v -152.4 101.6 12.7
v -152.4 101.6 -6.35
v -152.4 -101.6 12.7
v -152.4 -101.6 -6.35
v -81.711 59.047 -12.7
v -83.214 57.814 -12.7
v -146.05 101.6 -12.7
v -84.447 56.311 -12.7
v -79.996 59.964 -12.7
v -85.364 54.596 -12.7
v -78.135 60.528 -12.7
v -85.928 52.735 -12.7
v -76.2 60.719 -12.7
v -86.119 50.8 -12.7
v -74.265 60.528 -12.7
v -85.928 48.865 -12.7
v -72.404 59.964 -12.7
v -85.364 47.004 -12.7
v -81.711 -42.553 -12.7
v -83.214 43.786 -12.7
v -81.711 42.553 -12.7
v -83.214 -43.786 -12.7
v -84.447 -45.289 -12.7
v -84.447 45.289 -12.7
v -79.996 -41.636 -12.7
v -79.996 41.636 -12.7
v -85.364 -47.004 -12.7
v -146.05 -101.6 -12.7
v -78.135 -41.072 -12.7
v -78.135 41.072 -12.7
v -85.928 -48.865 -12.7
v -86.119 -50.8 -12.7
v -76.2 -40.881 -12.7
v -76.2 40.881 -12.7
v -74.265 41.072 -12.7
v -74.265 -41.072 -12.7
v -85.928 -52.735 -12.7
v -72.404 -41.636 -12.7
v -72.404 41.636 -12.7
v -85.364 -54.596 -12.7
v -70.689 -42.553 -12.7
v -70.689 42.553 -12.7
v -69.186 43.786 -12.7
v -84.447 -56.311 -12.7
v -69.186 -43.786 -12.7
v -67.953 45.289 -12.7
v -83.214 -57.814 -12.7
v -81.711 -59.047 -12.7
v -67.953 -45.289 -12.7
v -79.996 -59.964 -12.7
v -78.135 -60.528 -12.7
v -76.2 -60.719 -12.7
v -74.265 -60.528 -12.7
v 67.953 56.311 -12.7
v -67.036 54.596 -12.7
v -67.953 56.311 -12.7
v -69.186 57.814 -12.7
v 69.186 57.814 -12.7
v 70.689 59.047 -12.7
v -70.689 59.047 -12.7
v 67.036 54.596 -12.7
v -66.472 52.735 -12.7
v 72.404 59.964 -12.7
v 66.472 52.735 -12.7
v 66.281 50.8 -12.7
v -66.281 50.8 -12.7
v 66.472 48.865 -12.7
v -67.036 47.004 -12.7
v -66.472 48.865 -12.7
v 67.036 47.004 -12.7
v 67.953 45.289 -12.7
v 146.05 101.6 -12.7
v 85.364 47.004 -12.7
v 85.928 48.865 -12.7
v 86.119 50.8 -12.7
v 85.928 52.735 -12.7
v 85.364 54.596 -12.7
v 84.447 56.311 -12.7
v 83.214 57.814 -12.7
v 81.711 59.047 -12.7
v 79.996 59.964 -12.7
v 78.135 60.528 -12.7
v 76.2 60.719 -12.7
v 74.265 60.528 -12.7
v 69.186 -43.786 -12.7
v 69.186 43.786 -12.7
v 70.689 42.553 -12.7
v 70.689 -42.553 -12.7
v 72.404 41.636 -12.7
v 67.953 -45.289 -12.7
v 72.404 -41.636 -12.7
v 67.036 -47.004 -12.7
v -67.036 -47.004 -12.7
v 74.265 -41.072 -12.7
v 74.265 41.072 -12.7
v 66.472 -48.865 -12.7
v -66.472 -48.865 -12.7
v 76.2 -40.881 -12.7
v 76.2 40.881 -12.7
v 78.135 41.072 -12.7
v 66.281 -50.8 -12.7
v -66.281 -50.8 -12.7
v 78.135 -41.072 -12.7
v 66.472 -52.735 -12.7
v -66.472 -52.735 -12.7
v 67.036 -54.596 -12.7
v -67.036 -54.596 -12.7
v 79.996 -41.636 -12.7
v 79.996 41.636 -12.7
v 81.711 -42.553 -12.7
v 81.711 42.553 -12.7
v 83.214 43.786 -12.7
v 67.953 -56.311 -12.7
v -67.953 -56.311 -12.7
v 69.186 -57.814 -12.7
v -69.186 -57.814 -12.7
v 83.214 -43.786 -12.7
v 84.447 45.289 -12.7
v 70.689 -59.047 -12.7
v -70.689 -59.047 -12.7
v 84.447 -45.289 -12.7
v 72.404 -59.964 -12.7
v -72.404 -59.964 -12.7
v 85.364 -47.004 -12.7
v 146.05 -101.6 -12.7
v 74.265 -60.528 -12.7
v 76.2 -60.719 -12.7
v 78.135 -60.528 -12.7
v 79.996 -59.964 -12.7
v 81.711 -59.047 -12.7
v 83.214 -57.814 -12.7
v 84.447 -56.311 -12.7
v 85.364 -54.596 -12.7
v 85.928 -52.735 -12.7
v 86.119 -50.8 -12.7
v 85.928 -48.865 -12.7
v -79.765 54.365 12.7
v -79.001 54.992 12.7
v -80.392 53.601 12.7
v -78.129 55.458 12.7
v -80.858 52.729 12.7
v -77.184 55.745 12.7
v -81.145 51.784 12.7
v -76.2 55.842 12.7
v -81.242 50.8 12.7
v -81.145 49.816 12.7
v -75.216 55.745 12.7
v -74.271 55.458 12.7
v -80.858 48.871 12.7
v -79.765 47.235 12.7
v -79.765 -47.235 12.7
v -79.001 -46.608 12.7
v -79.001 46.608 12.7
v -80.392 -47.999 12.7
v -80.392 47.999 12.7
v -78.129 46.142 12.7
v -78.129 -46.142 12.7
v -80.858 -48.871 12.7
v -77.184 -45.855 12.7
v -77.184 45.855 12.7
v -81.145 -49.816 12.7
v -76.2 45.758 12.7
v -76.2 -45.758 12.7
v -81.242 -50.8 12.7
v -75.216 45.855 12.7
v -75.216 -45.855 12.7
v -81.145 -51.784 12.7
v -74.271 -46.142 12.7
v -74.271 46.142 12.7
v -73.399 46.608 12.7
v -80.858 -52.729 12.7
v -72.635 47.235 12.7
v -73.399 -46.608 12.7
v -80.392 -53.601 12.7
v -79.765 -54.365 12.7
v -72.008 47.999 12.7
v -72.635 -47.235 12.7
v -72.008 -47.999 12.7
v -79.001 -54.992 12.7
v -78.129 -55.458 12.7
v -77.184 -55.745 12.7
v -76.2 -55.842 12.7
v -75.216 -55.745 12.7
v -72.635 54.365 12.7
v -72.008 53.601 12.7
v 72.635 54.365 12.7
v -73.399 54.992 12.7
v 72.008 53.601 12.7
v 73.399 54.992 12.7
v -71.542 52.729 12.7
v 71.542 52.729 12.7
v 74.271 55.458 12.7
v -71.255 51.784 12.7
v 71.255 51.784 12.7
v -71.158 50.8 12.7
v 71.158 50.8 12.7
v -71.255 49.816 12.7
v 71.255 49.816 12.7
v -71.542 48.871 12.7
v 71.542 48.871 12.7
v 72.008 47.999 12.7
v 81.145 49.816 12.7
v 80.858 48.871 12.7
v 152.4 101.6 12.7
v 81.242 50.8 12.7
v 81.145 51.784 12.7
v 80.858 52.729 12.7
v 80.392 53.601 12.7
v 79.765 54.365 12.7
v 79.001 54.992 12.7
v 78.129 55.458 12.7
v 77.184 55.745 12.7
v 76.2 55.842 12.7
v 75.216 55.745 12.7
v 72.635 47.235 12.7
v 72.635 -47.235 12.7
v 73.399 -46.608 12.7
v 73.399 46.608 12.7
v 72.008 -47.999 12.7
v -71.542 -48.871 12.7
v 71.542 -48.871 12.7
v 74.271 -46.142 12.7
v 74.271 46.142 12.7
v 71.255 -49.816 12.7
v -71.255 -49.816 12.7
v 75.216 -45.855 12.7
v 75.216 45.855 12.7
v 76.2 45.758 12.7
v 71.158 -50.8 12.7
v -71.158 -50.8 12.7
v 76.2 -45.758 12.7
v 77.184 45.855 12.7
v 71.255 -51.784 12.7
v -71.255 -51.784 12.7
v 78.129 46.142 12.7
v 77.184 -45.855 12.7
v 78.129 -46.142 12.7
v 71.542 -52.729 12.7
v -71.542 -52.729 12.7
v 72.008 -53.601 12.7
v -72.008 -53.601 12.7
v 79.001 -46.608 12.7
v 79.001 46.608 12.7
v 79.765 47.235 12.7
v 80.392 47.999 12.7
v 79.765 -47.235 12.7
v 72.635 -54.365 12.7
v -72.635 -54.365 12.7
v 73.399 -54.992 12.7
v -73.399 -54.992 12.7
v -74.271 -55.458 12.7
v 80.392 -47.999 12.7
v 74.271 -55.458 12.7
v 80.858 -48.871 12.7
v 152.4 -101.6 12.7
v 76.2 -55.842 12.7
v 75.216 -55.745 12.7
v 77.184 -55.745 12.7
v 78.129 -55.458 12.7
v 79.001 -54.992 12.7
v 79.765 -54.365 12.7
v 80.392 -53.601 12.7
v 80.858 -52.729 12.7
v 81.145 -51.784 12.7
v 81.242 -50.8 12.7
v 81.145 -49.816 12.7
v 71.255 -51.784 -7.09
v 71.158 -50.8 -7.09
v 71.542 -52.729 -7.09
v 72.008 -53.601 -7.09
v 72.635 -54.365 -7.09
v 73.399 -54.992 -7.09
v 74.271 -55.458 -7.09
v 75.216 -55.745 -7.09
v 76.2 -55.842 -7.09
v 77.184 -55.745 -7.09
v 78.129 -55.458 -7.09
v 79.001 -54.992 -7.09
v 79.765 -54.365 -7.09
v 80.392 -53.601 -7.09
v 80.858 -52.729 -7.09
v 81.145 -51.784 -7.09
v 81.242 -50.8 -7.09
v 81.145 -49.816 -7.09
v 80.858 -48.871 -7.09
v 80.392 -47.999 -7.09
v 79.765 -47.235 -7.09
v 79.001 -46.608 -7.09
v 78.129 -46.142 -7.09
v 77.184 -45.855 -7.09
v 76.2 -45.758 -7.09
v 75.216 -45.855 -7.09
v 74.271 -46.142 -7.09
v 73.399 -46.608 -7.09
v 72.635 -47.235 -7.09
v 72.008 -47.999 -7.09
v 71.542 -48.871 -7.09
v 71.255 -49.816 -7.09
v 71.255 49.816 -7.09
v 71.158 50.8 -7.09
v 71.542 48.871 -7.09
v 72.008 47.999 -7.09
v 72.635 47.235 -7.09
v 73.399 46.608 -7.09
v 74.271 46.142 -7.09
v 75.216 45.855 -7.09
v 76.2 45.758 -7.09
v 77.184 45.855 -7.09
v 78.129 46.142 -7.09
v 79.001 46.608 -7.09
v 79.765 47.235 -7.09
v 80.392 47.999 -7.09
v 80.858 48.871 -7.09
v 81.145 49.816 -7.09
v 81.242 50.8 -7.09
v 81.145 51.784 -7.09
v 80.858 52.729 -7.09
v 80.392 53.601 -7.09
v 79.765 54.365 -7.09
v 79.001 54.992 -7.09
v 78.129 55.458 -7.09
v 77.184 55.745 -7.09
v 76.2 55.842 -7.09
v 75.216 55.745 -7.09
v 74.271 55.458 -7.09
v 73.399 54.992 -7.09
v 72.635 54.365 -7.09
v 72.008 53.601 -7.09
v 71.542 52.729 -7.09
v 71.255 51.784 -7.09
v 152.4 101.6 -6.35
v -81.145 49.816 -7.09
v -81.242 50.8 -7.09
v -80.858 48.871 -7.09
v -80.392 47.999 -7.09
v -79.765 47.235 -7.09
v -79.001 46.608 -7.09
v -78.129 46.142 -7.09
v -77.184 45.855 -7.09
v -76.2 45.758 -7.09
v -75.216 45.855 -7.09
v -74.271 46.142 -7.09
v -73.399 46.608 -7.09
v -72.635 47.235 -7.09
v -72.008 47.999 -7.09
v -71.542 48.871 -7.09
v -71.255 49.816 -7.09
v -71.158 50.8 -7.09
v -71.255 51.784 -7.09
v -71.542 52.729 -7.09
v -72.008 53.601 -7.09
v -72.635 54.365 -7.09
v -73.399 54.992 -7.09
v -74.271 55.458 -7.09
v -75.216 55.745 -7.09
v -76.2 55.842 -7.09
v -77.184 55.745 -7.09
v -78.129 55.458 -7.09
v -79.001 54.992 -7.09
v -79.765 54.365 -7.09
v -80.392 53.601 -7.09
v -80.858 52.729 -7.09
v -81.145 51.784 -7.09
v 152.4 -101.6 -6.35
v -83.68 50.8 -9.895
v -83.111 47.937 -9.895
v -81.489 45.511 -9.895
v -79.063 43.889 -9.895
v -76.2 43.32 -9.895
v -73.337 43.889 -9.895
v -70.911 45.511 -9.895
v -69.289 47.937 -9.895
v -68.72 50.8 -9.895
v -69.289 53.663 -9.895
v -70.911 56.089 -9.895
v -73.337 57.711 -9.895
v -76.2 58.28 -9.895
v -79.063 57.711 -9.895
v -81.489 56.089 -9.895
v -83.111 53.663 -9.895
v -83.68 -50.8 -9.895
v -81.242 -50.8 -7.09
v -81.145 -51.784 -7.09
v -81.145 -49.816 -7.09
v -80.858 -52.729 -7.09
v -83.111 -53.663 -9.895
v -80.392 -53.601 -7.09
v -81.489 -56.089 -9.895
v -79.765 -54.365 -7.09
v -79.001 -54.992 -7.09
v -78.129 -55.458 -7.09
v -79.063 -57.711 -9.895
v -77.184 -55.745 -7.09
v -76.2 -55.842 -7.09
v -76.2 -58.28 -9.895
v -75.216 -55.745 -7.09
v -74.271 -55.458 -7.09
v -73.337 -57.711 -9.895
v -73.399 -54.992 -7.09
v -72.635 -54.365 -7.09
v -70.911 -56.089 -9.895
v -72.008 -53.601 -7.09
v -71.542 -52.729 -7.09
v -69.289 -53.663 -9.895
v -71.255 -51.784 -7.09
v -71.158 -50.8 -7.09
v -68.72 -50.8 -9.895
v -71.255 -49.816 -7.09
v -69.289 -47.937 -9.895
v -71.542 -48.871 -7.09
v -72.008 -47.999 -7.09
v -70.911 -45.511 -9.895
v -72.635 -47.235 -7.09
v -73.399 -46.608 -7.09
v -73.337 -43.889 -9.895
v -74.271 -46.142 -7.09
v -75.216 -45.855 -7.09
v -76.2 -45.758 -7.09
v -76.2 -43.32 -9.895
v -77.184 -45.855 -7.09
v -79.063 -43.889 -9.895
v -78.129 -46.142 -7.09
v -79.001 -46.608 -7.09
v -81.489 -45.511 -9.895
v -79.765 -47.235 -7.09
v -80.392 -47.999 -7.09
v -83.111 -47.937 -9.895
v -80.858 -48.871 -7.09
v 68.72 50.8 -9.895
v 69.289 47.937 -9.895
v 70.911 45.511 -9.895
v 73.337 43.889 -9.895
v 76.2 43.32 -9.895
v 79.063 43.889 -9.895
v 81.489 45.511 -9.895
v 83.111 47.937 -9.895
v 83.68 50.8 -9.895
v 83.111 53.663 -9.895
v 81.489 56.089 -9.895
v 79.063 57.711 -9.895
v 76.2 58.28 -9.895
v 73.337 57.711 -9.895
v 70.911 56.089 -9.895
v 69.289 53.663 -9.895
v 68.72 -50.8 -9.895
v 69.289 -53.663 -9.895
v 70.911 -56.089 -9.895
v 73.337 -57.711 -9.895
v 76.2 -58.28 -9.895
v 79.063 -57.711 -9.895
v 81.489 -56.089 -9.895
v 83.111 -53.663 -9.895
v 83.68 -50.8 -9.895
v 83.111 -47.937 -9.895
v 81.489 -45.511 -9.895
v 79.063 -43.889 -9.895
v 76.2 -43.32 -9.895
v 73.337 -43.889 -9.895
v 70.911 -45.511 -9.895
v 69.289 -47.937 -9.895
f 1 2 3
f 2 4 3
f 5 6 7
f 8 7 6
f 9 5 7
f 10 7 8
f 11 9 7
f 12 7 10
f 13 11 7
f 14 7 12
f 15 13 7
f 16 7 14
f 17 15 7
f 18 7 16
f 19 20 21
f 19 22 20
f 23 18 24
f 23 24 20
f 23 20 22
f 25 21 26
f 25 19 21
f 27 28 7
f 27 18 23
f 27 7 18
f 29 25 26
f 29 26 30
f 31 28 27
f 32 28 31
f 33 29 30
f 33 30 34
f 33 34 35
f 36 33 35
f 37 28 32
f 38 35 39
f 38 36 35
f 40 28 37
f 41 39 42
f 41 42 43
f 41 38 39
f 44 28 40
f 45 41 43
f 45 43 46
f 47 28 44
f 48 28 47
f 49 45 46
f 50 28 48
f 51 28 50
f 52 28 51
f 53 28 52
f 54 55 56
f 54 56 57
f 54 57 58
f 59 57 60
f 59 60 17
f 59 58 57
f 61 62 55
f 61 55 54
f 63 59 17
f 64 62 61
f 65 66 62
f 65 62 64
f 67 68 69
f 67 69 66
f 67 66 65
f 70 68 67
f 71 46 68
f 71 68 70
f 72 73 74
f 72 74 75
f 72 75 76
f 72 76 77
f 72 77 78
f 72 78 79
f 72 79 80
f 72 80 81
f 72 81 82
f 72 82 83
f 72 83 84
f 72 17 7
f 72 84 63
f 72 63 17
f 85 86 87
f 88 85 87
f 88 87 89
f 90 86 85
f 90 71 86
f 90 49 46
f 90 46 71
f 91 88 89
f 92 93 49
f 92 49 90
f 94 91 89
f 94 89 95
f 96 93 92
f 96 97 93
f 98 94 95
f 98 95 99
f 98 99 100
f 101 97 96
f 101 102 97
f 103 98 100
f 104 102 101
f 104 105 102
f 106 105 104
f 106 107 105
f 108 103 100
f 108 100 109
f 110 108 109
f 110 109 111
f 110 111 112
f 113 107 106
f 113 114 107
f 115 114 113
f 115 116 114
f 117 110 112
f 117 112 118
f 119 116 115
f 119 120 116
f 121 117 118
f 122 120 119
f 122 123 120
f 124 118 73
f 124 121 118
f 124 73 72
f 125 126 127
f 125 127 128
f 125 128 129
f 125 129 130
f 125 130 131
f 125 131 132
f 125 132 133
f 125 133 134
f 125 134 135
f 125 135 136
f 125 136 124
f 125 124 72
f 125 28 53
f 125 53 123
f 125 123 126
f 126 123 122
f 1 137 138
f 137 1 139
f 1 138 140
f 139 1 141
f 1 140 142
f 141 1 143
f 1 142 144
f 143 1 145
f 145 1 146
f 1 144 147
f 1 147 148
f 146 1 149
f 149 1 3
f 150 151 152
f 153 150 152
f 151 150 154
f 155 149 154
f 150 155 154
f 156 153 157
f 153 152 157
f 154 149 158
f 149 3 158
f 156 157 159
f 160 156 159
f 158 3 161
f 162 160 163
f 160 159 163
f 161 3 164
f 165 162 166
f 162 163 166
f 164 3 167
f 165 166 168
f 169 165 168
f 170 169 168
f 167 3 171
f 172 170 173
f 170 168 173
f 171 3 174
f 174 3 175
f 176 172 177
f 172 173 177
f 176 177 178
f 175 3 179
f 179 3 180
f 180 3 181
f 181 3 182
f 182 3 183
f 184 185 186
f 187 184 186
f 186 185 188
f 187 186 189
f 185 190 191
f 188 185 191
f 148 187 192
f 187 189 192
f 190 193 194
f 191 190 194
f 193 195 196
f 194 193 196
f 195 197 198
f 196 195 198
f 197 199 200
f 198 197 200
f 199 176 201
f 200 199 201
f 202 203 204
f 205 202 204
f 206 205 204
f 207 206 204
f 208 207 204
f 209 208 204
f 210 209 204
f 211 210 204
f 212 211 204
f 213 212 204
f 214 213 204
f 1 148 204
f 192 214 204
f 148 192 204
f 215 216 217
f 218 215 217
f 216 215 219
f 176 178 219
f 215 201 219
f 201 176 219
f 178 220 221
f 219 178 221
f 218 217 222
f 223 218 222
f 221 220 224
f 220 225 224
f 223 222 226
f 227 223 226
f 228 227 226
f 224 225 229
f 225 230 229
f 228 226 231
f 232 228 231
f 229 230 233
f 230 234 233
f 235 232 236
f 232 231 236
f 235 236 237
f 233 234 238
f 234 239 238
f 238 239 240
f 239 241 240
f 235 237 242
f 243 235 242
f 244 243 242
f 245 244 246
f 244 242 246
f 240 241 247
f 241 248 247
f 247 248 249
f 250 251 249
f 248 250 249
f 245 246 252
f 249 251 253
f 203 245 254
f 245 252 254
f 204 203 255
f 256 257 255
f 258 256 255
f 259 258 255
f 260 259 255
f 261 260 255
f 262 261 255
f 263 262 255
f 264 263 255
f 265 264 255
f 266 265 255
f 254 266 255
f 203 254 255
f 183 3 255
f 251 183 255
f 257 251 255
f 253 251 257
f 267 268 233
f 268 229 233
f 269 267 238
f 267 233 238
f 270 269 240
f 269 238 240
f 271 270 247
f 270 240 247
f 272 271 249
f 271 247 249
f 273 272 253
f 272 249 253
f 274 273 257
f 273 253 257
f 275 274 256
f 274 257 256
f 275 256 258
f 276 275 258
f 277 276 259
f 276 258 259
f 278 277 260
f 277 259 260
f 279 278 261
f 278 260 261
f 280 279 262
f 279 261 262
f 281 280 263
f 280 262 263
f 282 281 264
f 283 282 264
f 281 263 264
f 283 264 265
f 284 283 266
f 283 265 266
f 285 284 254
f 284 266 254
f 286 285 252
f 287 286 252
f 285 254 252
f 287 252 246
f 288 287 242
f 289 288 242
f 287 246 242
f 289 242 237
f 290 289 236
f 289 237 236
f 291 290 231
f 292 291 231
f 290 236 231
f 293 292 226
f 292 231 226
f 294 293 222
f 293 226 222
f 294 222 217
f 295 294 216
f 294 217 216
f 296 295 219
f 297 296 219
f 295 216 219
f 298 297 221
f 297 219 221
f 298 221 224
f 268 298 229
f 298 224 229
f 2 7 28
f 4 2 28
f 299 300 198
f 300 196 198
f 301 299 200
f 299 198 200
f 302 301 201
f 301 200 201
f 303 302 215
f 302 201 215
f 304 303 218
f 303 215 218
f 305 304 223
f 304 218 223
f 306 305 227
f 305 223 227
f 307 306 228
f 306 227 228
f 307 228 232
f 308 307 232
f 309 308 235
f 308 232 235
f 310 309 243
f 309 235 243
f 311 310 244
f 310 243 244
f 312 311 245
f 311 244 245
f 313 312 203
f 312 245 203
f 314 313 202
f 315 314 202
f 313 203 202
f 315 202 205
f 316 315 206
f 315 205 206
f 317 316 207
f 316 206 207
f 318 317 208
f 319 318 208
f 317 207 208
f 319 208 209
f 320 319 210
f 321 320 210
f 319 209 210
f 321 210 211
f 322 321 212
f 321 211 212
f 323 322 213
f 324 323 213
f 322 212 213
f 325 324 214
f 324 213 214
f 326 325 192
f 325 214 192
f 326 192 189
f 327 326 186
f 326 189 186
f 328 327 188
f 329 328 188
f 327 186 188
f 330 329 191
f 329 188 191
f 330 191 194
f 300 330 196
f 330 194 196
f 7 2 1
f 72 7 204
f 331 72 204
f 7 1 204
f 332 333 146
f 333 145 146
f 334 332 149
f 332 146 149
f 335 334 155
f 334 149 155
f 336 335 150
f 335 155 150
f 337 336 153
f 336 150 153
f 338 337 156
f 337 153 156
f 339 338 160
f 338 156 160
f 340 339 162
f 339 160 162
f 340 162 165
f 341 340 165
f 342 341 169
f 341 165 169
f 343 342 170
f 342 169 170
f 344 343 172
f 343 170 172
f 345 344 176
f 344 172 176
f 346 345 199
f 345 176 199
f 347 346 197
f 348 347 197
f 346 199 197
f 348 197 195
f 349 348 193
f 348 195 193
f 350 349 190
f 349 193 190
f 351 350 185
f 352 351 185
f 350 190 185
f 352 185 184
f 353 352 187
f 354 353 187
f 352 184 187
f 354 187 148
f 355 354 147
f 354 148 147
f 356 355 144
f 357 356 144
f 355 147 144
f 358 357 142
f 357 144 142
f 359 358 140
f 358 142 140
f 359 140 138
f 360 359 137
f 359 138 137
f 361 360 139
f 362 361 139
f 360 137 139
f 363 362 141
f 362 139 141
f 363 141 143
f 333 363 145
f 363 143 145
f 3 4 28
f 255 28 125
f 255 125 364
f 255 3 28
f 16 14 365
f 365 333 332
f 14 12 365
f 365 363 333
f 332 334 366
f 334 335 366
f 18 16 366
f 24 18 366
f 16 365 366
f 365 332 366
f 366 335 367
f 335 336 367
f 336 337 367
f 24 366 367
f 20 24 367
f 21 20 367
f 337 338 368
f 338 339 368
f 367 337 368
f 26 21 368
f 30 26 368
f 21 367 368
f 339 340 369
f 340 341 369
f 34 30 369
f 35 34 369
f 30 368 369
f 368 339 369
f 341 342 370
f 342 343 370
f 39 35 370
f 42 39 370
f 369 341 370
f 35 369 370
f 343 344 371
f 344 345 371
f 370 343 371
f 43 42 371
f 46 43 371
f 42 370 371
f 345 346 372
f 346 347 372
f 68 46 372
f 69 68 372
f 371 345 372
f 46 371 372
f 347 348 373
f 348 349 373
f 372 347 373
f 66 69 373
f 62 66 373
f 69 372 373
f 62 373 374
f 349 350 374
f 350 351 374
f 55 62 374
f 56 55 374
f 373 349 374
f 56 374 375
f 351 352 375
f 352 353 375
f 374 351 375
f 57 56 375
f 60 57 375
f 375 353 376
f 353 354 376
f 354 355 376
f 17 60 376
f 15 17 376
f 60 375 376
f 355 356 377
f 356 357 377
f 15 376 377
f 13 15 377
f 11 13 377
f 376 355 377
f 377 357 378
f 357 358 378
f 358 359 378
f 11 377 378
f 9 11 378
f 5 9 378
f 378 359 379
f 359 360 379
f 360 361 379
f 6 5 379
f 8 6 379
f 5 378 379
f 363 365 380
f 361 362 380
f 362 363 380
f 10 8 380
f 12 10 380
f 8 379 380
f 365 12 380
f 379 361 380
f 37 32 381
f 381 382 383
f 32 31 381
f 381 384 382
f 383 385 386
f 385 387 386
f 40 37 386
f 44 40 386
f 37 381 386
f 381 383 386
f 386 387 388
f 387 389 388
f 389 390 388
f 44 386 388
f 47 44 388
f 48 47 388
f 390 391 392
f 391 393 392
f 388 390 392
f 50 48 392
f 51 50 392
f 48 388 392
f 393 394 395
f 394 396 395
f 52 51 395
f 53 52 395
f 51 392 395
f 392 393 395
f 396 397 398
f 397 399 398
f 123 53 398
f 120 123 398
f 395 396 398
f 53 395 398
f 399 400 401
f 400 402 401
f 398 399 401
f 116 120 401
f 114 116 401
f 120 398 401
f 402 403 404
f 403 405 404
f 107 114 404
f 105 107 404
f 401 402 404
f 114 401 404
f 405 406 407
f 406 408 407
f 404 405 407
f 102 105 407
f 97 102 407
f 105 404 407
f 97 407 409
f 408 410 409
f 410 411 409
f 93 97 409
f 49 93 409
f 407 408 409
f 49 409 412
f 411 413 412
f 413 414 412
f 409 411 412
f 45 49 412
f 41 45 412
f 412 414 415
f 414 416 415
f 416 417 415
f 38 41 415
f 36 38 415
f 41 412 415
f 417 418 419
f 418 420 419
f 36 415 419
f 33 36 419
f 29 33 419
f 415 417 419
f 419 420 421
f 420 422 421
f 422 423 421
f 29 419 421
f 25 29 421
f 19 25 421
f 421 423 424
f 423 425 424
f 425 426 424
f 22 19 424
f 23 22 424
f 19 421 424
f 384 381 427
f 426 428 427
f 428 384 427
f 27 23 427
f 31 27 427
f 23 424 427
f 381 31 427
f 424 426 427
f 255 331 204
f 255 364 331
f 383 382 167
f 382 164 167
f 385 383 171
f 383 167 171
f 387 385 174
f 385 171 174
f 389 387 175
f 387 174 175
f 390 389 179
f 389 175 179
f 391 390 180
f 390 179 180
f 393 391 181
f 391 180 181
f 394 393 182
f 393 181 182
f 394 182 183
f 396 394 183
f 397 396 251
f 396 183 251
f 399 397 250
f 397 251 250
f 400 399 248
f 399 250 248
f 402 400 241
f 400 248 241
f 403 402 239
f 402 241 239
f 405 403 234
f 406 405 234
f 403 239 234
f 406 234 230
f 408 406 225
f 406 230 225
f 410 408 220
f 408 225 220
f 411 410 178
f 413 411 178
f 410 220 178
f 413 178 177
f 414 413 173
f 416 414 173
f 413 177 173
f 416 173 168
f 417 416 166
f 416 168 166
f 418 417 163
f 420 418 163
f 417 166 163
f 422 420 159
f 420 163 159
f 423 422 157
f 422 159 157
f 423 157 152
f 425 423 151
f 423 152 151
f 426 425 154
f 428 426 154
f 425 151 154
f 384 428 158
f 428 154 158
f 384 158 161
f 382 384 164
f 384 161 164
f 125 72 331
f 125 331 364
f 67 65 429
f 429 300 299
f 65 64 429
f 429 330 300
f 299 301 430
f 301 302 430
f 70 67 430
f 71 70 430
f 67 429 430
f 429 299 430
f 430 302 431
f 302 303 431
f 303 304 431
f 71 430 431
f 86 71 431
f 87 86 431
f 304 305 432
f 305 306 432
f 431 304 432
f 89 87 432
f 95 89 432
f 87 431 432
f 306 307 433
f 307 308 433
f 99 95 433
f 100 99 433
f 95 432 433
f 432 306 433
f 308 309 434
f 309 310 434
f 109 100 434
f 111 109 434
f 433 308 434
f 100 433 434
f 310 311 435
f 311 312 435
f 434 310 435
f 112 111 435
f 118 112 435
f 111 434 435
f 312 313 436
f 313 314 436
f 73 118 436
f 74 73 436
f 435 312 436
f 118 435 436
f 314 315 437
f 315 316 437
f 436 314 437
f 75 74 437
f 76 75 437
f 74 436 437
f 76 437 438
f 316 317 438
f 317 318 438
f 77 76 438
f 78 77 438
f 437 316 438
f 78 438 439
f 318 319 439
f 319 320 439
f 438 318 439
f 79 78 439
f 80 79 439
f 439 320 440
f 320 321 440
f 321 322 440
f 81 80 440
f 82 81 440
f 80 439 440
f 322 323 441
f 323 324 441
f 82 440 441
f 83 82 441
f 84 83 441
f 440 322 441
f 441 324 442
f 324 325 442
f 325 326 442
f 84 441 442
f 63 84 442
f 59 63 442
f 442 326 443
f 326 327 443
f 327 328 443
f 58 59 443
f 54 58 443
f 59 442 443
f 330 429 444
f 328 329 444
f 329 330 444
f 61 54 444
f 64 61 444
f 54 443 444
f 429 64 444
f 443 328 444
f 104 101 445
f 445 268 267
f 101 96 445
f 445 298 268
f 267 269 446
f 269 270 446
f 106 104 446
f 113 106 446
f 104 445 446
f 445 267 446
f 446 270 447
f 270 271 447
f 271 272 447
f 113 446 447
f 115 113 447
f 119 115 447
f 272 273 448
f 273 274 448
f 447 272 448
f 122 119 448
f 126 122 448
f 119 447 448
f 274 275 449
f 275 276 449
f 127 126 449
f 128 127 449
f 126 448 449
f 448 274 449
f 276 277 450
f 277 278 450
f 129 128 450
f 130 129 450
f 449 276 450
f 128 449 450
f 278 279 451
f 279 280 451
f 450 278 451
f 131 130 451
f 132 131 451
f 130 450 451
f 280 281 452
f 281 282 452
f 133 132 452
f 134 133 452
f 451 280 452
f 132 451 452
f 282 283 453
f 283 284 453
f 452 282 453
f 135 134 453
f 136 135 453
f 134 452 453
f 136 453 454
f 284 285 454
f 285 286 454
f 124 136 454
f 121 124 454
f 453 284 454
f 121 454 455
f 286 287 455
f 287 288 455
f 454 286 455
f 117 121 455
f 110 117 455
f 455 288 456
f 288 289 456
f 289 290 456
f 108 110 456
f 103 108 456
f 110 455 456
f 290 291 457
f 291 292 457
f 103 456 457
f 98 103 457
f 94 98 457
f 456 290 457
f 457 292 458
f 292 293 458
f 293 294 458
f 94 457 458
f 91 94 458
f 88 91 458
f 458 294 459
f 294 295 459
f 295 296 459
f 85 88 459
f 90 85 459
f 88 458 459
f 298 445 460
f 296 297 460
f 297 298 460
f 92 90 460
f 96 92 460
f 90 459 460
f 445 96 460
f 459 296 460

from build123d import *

# Parameters (mm, degrees)
F0_W           = 304.8
F0_H           = 25.4
F1_DEPTH       = 101.6
F2_SIZE        = 6.35
F4_D           = 10.0838
F4_CSINK_D     = 19.8374
F4_CSINK_ANGLE = 82


with BuildPart() as f1:
    # F0 (on Front) → F1 (new body, symmetric)
    with BuildSketch(Plane.XZ):
        Rectangle(F0_W, F0_H)
    extrude(amount=F1_DEPTH, both=True)

    # F2
    f2_edges = [f1.edges().sort_by_distance(p)[0] for p in [
        (152.4, 0, -12.7),
        (-152.4, 0, -12.7),
    ]]
    chamfer(f2_edges, length=F2_SIZE)

    # F4 (through all)
    with Locations(Plane(origin=(0, 0, -12.7), x_dir=(1, 0, 0), z_dir=(0, 0, -1))):
        with Locations((-76.2, 50.8), (76.2, 50.8), (76.2, -50.8), (-76.2, -50.8)):
            CounterSinkHole(F4_D / 2, F4_CSINK_D / 2, counter_sink_angle=F4_CSINK_ANGLE)


solid = f1.part
